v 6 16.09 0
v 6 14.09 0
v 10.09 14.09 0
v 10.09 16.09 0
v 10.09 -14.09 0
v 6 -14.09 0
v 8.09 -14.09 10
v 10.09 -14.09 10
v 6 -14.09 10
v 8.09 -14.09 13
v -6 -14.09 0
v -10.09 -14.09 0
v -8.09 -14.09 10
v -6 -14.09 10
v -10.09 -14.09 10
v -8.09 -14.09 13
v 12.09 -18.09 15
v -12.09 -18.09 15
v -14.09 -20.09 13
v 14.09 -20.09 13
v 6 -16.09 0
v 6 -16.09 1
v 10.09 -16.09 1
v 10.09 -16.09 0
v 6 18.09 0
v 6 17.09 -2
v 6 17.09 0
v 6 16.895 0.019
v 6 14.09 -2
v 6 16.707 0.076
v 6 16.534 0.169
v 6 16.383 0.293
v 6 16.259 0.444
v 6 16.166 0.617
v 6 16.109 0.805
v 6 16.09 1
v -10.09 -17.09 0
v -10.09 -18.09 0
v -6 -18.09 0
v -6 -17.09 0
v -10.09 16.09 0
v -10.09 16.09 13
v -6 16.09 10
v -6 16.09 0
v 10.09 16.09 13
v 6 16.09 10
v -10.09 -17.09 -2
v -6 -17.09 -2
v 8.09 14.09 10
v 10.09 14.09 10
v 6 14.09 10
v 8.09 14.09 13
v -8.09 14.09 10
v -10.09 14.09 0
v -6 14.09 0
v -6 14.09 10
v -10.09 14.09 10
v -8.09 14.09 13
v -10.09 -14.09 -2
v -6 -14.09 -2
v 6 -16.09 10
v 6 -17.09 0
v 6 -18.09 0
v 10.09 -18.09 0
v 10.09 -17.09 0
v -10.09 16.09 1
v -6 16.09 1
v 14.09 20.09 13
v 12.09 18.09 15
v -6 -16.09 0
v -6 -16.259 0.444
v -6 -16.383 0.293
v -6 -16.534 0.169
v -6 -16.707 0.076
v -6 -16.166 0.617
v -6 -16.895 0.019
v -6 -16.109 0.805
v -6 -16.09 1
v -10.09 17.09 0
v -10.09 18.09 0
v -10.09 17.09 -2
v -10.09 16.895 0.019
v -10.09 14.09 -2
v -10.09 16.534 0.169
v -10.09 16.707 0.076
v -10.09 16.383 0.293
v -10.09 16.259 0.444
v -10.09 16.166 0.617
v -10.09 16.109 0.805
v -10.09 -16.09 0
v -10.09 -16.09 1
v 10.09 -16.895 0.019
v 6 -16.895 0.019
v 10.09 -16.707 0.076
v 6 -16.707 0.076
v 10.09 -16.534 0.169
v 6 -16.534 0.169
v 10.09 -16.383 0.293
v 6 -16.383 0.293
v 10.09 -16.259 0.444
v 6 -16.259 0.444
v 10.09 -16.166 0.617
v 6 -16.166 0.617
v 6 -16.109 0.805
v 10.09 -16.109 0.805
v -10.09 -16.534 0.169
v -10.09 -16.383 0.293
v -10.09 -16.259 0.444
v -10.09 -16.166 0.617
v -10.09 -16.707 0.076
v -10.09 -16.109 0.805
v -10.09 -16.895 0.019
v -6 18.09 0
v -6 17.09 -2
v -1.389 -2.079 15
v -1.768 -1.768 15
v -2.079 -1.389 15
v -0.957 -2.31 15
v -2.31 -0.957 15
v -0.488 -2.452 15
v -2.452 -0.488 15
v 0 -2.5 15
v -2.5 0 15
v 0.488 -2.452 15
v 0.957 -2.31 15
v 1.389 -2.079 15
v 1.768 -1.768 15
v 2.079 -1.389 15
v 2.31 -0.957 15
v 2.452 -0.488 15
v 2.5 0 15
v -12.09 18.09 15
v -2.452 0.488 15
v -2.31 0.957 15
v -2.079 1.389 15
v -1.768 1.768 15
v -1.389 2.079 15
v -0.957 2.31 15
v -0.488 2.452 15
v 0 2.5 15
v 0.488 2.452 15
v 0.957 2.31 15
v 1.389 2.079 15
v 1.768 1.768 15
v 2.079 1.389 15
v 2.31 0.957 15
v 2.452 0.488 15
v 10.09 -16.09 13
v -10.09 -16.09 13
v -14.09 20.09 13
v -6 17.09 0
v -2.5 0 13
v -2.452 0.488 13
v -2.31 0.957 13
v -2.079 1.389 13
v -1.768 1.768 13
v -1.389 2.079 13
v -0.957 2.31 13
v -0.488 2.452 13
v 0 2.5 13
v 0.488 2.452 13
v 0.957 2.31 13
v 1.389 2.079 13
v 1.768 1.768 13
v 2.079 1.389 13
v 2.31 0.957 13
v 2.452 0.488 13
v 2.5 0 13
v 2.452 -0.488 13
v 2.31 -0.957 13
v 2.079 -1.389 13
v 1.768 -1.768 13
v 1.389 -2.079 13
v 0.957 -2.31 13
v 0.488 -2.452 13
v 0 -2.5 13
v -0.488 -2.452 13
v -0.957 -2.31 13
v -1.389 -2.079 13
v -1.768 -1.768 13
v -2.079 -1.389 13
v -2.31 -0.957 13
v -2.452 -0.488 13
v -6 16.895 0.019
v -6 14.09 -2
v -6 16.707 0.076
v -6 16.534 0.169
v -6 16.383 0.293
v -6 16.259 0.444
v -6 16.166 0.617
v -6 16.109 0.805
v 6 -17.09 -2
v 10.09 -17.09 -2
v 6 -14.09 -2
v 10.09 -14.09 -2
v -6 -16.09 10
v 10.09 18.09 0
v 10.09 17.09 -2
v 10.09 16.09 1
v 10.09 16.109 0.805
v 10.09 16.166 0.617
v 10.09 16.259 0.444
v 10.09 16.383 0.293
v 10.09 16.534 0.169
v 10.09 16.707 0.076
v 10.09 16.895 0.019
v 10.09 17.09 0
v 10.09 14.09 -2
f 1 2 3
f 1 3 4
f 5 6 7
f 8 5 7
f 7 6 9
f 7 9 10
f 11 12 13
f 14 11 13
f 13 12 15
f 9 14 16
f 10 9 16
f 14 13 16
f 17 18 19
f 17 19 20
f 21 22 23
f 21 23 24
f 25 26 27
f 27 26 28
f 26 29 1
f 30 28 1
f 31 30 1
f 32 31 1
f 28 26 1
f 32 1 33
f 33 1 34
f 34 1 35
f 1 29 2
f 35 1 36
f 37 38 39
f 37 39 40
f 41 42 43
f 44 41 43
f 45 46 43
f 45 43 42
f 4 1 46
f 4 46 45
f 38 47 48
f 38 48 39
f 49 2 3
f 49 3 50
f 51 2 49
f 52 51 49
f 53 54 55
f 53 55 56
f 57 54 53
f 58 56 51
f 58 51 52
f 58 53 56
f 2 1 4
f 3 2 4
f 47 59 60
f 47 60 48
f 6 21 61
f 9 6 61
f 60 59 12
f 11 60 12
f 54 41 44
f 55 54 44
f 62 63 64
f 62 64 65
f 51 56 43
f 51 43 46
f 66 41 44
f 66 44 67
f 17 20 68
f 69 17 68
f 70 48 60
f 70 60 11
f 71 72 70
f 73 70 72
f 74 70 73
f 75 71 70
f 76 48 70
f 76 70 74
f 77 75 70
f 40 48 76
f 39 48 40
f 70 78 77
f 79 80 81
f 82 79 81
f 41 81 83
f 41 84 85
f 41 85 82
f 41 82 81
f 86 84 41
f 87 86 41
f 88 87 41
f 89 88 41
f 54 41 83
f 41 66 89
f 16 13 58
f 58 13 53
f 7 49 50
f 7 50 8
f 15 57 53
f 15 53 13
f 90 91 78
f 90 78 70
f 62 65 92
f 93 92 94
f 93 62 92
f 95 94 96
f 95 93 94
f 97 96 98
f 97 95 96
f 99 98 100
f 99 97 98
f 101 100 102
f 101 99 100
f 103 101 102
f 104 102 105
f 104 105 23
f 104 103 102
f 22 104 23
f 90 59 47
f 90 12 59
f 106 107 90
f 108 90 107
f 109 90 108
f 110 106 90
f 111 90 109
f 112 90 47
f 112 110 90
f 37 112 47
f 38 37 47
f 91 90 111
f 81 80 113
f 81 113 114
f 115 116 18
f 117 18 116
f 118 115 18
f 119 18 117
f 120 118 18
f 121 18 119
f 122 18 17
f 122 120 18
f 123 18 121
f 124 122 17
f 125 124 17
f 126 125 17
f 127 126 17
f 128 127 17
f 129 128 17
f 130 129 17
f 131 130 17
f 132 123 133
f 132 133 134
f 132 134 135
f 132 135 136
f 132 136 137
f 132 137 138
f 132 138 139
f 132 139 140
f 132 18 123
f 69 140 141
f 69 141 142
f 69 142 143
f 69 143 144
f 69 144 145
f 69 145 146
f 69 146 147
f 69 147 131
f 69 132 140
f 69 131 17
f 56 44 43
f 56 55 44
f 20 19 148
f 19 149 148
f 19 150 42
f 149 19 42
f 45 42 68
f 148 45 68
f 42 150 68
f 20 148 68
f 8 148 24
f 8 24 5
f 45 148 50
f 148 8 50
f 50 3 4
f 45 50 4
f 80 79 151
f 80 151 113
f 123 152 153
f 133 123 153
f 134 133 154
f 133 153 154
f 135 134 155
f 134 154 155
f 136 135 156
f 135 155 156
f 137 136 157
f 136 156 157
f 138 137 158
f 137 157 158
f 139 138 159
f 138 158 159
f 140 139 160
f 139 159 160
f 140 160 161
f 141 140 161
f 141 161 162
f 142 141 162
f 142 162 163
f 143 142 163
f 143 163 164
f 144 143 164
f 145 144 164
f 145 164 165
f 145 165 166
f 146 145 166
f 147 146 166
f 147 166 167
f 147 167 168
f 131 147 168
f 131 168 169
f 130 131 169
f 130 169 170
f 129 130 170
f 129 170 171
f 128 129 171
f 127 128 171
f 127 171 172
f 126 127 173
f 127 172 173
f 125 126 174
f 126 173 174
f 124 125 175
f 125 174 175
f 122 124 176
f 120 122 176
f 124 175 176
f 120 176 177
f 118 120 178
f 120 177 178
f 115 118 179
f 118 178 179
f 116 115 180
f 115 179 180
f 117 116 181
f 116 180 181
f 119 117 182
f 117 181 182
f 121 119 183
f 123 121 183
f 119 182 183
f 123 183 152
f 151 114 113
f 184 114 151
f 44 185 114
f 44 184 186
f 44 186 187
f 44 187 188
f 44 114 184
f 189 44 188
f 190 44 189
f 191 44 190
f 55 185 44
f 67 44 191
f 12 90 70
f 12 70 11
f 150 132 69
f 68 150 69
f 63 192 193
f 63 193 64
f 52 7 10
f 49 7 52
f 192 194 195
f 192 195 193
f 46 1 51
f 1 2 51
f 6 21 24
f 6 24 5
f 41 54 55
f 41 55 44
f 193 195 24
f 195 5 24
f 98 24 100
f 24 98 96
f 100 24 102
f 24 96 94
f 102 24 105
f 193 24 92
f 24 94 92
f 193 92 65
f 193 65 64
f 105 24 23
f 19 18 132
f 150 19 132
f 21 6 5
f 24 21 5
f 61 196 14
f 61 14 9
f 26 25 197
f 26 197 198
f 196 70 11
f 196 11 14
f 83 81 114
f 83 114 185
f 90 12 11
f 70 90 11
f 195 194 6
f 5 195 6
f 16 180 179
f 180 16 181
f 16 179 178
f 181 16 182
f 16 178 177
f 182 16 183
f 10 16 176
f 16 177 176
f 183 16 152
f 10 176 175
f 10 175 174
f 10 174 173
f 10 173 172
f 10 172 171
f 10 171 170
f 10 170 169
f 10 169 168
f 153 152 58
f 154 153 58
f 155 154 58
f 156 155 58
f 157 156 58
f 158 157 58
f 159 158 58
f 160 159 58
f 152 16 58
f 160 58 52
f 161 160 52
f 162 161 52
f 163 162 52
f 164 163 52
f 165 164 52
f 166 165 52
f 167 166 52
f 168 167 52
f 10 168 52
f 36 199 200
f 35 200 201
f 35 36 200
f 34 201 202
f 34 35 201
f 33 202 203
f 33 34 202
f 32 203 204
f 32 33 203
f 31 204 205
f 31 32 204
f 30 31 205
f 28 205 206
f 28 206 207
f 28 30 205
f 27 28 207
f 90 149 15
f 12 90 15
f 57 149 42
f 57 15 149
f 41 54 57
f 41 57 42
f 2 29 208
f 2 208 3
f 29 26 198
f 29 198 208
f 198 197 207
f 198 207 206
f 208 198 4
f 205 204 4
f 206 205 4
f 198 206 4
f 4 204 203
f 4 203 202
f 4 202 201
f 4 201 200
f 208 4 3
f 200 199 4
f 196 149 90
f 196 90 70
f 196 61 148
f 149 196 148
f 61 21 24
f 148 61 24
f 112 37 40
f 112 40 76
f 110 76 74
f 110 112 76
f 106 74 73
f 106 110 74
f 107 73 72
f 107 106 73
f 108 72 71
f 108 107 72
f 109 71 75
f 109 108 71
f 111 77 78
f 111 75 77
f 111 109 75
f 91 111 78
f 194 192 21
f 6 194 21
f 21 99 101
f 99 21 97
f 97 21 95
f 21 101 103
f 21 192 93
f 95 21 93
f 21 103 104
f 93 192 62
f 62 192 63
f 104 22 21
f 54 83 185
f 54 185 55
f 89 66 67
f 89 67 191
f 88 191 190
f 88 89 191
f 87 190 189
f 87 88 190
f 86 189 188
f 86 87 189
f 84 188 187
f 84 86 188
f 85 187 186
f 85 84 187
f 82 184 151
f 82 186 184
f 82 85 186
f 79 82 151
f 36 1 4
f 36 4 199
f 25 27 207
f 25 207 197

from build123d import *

# Parameters (mm, degrees)
F0_W      = 20.18
F0_H      = 32.18
F0_W_2    = 16.18
F0_H_2    = 28.18
F1_DEPTH  = 13
F2_W      = 28.18
F2_H      = 40.18
F2_W_2    = 20.18
F2_H_2    = 32.18
F2_W_3    = 16.18
F2_H_3    = 28.18
F3_DEPTH  = 2
F4_SIZE   = 1.99999
F6_D      = 5
F8_DEPTH  = 20.18
F9_W      = 28.18
F9_H      = 12
F10_DEPTH = 25
F11_W     = 12
F11_H     = 20
F12_DEPTH = 25


# Not quite as in the source:
# - a fillet or chamfer is up to 0.001 mm smaller than in the source, because OpenCascade refuses the exact size


with BuildPart() as f1:
    # F0 (on Top) → F1 (new body)
    with BuildSketch(Plane.XY):
        Rectangle(F0_W, F0_H)
        Rectangle(F0_W_2, F0_H_2, mode=Mode.SUBTRACT)
    extrude(amount=F1_DEPTH)

    # F2 (on face) → F3 (join)
    with BuildSketch(Plane.XY.offset(13)):
        Rectangle(F2_W, F2_H)
        Rectangle(F2_W_2, F2_H_2, mode=Mode.SUBTRACT)
        Rectangle(F2_W_2, F2_H_2)
        Rectangle(F2_W_3, F2_H_3, mode=Mode.SUBTRACT)
        Rectangle(F2_W_3, F2_H_3)
    extrude(amount=F3_DEPTH)

    # F4 (size 2 in the source; OpenCascade refuses exactly that, so slightly less here)
    f4_edges = [f1.edges().sort_by_distance(p)[0] for p in [
        (0, -20.09, 15),
        (-14.09, 0, 15),
        (0, 20.09, 15),
        (14.09, 0, 15),
    ]]
    chamfer(f4_edges, length=F4_SIZE)

    # F6 (through all)
    with Locations(Plane.XY.offset(15)):
        with Locations((0, 0)):
            Hole(F6_D / 2)


with BuildPart() as f8:
    # F7 (on face) → F8 (new body)
    with BuildSketch(Plane(origin=(-10.09, 0, 0), x_dir=(0, -1, 0), z_dir=(-1, 0, 0))):
        with BuildLine():
            Line((17.09, -2), (18.09, 0))
            Line((18.09, 0), (17.09, 0))
            ThreePointArc((17.09, 0), (16.3828932188, 0.2928932188), (16.09, 1))
            Line((16.09, 1), (16.09, 0))
            Line((16.09, 0), (-16.09, 0))
            Line((-16.09, 0), (-16.09, 1))
            ThreePointArc((-16.09, 1), (-16.3828932188, 0.2928932188), (-17.09, 0))
            Line((-17.09, 0), (-18.09, 0))
            Line((-18.09, 0), (-17.09, -2))
            Line((-17.09, -2), (17.09, -2))
        make_face()
    extrude(amount=-F8_DEPTH)


with BuildPart() as f10_tool:
    # F9 (on face) → F10 (new body)
    with BuildSketch(Plane(origin=(-10.09, 0, 0), x_dir=(0, -1, 0), z_dir=(-1, 0, 0))):
        with Locations((0, 4)):
            Rectangle(F9_W, F9_H)
    extrude(amount=-F10_DEPTH)


with BuildPart() as f1_1:
    add(f1.part)

    # F10: cut by f10_tool
    add(f10_tool.part, mode=Mode.SUBTRACT)


with BuildPart() as f8_1:
    add(f8.part)

    # F10: cut by f10_tool
    add(f10_tool.part, mode=Mode.SUBTRACT)


with BuildPart() as f12_tool:
    # F11 (on Front) → F12 (new body, symmetric)
    with BuildSketch(Plane.XZ):
        Rectangle(F11_W, F11_H)
    extrude(amount=F12_DEPTH, both=True)


with BuildPart() as f1_2:
    add(f1_1.part)

    # F12: cut by f12_tool
    add(f12_tool.part, mode=Mode.SUBTRACT)


with BuildPart() as f8_2:
    add(f8_1.part)

    # F12: cut by f12_tool
    add(f12_tool.part, mode=Mode.SUBTRACT)


solid = Compound([f1_2.part, f8_2.part])
